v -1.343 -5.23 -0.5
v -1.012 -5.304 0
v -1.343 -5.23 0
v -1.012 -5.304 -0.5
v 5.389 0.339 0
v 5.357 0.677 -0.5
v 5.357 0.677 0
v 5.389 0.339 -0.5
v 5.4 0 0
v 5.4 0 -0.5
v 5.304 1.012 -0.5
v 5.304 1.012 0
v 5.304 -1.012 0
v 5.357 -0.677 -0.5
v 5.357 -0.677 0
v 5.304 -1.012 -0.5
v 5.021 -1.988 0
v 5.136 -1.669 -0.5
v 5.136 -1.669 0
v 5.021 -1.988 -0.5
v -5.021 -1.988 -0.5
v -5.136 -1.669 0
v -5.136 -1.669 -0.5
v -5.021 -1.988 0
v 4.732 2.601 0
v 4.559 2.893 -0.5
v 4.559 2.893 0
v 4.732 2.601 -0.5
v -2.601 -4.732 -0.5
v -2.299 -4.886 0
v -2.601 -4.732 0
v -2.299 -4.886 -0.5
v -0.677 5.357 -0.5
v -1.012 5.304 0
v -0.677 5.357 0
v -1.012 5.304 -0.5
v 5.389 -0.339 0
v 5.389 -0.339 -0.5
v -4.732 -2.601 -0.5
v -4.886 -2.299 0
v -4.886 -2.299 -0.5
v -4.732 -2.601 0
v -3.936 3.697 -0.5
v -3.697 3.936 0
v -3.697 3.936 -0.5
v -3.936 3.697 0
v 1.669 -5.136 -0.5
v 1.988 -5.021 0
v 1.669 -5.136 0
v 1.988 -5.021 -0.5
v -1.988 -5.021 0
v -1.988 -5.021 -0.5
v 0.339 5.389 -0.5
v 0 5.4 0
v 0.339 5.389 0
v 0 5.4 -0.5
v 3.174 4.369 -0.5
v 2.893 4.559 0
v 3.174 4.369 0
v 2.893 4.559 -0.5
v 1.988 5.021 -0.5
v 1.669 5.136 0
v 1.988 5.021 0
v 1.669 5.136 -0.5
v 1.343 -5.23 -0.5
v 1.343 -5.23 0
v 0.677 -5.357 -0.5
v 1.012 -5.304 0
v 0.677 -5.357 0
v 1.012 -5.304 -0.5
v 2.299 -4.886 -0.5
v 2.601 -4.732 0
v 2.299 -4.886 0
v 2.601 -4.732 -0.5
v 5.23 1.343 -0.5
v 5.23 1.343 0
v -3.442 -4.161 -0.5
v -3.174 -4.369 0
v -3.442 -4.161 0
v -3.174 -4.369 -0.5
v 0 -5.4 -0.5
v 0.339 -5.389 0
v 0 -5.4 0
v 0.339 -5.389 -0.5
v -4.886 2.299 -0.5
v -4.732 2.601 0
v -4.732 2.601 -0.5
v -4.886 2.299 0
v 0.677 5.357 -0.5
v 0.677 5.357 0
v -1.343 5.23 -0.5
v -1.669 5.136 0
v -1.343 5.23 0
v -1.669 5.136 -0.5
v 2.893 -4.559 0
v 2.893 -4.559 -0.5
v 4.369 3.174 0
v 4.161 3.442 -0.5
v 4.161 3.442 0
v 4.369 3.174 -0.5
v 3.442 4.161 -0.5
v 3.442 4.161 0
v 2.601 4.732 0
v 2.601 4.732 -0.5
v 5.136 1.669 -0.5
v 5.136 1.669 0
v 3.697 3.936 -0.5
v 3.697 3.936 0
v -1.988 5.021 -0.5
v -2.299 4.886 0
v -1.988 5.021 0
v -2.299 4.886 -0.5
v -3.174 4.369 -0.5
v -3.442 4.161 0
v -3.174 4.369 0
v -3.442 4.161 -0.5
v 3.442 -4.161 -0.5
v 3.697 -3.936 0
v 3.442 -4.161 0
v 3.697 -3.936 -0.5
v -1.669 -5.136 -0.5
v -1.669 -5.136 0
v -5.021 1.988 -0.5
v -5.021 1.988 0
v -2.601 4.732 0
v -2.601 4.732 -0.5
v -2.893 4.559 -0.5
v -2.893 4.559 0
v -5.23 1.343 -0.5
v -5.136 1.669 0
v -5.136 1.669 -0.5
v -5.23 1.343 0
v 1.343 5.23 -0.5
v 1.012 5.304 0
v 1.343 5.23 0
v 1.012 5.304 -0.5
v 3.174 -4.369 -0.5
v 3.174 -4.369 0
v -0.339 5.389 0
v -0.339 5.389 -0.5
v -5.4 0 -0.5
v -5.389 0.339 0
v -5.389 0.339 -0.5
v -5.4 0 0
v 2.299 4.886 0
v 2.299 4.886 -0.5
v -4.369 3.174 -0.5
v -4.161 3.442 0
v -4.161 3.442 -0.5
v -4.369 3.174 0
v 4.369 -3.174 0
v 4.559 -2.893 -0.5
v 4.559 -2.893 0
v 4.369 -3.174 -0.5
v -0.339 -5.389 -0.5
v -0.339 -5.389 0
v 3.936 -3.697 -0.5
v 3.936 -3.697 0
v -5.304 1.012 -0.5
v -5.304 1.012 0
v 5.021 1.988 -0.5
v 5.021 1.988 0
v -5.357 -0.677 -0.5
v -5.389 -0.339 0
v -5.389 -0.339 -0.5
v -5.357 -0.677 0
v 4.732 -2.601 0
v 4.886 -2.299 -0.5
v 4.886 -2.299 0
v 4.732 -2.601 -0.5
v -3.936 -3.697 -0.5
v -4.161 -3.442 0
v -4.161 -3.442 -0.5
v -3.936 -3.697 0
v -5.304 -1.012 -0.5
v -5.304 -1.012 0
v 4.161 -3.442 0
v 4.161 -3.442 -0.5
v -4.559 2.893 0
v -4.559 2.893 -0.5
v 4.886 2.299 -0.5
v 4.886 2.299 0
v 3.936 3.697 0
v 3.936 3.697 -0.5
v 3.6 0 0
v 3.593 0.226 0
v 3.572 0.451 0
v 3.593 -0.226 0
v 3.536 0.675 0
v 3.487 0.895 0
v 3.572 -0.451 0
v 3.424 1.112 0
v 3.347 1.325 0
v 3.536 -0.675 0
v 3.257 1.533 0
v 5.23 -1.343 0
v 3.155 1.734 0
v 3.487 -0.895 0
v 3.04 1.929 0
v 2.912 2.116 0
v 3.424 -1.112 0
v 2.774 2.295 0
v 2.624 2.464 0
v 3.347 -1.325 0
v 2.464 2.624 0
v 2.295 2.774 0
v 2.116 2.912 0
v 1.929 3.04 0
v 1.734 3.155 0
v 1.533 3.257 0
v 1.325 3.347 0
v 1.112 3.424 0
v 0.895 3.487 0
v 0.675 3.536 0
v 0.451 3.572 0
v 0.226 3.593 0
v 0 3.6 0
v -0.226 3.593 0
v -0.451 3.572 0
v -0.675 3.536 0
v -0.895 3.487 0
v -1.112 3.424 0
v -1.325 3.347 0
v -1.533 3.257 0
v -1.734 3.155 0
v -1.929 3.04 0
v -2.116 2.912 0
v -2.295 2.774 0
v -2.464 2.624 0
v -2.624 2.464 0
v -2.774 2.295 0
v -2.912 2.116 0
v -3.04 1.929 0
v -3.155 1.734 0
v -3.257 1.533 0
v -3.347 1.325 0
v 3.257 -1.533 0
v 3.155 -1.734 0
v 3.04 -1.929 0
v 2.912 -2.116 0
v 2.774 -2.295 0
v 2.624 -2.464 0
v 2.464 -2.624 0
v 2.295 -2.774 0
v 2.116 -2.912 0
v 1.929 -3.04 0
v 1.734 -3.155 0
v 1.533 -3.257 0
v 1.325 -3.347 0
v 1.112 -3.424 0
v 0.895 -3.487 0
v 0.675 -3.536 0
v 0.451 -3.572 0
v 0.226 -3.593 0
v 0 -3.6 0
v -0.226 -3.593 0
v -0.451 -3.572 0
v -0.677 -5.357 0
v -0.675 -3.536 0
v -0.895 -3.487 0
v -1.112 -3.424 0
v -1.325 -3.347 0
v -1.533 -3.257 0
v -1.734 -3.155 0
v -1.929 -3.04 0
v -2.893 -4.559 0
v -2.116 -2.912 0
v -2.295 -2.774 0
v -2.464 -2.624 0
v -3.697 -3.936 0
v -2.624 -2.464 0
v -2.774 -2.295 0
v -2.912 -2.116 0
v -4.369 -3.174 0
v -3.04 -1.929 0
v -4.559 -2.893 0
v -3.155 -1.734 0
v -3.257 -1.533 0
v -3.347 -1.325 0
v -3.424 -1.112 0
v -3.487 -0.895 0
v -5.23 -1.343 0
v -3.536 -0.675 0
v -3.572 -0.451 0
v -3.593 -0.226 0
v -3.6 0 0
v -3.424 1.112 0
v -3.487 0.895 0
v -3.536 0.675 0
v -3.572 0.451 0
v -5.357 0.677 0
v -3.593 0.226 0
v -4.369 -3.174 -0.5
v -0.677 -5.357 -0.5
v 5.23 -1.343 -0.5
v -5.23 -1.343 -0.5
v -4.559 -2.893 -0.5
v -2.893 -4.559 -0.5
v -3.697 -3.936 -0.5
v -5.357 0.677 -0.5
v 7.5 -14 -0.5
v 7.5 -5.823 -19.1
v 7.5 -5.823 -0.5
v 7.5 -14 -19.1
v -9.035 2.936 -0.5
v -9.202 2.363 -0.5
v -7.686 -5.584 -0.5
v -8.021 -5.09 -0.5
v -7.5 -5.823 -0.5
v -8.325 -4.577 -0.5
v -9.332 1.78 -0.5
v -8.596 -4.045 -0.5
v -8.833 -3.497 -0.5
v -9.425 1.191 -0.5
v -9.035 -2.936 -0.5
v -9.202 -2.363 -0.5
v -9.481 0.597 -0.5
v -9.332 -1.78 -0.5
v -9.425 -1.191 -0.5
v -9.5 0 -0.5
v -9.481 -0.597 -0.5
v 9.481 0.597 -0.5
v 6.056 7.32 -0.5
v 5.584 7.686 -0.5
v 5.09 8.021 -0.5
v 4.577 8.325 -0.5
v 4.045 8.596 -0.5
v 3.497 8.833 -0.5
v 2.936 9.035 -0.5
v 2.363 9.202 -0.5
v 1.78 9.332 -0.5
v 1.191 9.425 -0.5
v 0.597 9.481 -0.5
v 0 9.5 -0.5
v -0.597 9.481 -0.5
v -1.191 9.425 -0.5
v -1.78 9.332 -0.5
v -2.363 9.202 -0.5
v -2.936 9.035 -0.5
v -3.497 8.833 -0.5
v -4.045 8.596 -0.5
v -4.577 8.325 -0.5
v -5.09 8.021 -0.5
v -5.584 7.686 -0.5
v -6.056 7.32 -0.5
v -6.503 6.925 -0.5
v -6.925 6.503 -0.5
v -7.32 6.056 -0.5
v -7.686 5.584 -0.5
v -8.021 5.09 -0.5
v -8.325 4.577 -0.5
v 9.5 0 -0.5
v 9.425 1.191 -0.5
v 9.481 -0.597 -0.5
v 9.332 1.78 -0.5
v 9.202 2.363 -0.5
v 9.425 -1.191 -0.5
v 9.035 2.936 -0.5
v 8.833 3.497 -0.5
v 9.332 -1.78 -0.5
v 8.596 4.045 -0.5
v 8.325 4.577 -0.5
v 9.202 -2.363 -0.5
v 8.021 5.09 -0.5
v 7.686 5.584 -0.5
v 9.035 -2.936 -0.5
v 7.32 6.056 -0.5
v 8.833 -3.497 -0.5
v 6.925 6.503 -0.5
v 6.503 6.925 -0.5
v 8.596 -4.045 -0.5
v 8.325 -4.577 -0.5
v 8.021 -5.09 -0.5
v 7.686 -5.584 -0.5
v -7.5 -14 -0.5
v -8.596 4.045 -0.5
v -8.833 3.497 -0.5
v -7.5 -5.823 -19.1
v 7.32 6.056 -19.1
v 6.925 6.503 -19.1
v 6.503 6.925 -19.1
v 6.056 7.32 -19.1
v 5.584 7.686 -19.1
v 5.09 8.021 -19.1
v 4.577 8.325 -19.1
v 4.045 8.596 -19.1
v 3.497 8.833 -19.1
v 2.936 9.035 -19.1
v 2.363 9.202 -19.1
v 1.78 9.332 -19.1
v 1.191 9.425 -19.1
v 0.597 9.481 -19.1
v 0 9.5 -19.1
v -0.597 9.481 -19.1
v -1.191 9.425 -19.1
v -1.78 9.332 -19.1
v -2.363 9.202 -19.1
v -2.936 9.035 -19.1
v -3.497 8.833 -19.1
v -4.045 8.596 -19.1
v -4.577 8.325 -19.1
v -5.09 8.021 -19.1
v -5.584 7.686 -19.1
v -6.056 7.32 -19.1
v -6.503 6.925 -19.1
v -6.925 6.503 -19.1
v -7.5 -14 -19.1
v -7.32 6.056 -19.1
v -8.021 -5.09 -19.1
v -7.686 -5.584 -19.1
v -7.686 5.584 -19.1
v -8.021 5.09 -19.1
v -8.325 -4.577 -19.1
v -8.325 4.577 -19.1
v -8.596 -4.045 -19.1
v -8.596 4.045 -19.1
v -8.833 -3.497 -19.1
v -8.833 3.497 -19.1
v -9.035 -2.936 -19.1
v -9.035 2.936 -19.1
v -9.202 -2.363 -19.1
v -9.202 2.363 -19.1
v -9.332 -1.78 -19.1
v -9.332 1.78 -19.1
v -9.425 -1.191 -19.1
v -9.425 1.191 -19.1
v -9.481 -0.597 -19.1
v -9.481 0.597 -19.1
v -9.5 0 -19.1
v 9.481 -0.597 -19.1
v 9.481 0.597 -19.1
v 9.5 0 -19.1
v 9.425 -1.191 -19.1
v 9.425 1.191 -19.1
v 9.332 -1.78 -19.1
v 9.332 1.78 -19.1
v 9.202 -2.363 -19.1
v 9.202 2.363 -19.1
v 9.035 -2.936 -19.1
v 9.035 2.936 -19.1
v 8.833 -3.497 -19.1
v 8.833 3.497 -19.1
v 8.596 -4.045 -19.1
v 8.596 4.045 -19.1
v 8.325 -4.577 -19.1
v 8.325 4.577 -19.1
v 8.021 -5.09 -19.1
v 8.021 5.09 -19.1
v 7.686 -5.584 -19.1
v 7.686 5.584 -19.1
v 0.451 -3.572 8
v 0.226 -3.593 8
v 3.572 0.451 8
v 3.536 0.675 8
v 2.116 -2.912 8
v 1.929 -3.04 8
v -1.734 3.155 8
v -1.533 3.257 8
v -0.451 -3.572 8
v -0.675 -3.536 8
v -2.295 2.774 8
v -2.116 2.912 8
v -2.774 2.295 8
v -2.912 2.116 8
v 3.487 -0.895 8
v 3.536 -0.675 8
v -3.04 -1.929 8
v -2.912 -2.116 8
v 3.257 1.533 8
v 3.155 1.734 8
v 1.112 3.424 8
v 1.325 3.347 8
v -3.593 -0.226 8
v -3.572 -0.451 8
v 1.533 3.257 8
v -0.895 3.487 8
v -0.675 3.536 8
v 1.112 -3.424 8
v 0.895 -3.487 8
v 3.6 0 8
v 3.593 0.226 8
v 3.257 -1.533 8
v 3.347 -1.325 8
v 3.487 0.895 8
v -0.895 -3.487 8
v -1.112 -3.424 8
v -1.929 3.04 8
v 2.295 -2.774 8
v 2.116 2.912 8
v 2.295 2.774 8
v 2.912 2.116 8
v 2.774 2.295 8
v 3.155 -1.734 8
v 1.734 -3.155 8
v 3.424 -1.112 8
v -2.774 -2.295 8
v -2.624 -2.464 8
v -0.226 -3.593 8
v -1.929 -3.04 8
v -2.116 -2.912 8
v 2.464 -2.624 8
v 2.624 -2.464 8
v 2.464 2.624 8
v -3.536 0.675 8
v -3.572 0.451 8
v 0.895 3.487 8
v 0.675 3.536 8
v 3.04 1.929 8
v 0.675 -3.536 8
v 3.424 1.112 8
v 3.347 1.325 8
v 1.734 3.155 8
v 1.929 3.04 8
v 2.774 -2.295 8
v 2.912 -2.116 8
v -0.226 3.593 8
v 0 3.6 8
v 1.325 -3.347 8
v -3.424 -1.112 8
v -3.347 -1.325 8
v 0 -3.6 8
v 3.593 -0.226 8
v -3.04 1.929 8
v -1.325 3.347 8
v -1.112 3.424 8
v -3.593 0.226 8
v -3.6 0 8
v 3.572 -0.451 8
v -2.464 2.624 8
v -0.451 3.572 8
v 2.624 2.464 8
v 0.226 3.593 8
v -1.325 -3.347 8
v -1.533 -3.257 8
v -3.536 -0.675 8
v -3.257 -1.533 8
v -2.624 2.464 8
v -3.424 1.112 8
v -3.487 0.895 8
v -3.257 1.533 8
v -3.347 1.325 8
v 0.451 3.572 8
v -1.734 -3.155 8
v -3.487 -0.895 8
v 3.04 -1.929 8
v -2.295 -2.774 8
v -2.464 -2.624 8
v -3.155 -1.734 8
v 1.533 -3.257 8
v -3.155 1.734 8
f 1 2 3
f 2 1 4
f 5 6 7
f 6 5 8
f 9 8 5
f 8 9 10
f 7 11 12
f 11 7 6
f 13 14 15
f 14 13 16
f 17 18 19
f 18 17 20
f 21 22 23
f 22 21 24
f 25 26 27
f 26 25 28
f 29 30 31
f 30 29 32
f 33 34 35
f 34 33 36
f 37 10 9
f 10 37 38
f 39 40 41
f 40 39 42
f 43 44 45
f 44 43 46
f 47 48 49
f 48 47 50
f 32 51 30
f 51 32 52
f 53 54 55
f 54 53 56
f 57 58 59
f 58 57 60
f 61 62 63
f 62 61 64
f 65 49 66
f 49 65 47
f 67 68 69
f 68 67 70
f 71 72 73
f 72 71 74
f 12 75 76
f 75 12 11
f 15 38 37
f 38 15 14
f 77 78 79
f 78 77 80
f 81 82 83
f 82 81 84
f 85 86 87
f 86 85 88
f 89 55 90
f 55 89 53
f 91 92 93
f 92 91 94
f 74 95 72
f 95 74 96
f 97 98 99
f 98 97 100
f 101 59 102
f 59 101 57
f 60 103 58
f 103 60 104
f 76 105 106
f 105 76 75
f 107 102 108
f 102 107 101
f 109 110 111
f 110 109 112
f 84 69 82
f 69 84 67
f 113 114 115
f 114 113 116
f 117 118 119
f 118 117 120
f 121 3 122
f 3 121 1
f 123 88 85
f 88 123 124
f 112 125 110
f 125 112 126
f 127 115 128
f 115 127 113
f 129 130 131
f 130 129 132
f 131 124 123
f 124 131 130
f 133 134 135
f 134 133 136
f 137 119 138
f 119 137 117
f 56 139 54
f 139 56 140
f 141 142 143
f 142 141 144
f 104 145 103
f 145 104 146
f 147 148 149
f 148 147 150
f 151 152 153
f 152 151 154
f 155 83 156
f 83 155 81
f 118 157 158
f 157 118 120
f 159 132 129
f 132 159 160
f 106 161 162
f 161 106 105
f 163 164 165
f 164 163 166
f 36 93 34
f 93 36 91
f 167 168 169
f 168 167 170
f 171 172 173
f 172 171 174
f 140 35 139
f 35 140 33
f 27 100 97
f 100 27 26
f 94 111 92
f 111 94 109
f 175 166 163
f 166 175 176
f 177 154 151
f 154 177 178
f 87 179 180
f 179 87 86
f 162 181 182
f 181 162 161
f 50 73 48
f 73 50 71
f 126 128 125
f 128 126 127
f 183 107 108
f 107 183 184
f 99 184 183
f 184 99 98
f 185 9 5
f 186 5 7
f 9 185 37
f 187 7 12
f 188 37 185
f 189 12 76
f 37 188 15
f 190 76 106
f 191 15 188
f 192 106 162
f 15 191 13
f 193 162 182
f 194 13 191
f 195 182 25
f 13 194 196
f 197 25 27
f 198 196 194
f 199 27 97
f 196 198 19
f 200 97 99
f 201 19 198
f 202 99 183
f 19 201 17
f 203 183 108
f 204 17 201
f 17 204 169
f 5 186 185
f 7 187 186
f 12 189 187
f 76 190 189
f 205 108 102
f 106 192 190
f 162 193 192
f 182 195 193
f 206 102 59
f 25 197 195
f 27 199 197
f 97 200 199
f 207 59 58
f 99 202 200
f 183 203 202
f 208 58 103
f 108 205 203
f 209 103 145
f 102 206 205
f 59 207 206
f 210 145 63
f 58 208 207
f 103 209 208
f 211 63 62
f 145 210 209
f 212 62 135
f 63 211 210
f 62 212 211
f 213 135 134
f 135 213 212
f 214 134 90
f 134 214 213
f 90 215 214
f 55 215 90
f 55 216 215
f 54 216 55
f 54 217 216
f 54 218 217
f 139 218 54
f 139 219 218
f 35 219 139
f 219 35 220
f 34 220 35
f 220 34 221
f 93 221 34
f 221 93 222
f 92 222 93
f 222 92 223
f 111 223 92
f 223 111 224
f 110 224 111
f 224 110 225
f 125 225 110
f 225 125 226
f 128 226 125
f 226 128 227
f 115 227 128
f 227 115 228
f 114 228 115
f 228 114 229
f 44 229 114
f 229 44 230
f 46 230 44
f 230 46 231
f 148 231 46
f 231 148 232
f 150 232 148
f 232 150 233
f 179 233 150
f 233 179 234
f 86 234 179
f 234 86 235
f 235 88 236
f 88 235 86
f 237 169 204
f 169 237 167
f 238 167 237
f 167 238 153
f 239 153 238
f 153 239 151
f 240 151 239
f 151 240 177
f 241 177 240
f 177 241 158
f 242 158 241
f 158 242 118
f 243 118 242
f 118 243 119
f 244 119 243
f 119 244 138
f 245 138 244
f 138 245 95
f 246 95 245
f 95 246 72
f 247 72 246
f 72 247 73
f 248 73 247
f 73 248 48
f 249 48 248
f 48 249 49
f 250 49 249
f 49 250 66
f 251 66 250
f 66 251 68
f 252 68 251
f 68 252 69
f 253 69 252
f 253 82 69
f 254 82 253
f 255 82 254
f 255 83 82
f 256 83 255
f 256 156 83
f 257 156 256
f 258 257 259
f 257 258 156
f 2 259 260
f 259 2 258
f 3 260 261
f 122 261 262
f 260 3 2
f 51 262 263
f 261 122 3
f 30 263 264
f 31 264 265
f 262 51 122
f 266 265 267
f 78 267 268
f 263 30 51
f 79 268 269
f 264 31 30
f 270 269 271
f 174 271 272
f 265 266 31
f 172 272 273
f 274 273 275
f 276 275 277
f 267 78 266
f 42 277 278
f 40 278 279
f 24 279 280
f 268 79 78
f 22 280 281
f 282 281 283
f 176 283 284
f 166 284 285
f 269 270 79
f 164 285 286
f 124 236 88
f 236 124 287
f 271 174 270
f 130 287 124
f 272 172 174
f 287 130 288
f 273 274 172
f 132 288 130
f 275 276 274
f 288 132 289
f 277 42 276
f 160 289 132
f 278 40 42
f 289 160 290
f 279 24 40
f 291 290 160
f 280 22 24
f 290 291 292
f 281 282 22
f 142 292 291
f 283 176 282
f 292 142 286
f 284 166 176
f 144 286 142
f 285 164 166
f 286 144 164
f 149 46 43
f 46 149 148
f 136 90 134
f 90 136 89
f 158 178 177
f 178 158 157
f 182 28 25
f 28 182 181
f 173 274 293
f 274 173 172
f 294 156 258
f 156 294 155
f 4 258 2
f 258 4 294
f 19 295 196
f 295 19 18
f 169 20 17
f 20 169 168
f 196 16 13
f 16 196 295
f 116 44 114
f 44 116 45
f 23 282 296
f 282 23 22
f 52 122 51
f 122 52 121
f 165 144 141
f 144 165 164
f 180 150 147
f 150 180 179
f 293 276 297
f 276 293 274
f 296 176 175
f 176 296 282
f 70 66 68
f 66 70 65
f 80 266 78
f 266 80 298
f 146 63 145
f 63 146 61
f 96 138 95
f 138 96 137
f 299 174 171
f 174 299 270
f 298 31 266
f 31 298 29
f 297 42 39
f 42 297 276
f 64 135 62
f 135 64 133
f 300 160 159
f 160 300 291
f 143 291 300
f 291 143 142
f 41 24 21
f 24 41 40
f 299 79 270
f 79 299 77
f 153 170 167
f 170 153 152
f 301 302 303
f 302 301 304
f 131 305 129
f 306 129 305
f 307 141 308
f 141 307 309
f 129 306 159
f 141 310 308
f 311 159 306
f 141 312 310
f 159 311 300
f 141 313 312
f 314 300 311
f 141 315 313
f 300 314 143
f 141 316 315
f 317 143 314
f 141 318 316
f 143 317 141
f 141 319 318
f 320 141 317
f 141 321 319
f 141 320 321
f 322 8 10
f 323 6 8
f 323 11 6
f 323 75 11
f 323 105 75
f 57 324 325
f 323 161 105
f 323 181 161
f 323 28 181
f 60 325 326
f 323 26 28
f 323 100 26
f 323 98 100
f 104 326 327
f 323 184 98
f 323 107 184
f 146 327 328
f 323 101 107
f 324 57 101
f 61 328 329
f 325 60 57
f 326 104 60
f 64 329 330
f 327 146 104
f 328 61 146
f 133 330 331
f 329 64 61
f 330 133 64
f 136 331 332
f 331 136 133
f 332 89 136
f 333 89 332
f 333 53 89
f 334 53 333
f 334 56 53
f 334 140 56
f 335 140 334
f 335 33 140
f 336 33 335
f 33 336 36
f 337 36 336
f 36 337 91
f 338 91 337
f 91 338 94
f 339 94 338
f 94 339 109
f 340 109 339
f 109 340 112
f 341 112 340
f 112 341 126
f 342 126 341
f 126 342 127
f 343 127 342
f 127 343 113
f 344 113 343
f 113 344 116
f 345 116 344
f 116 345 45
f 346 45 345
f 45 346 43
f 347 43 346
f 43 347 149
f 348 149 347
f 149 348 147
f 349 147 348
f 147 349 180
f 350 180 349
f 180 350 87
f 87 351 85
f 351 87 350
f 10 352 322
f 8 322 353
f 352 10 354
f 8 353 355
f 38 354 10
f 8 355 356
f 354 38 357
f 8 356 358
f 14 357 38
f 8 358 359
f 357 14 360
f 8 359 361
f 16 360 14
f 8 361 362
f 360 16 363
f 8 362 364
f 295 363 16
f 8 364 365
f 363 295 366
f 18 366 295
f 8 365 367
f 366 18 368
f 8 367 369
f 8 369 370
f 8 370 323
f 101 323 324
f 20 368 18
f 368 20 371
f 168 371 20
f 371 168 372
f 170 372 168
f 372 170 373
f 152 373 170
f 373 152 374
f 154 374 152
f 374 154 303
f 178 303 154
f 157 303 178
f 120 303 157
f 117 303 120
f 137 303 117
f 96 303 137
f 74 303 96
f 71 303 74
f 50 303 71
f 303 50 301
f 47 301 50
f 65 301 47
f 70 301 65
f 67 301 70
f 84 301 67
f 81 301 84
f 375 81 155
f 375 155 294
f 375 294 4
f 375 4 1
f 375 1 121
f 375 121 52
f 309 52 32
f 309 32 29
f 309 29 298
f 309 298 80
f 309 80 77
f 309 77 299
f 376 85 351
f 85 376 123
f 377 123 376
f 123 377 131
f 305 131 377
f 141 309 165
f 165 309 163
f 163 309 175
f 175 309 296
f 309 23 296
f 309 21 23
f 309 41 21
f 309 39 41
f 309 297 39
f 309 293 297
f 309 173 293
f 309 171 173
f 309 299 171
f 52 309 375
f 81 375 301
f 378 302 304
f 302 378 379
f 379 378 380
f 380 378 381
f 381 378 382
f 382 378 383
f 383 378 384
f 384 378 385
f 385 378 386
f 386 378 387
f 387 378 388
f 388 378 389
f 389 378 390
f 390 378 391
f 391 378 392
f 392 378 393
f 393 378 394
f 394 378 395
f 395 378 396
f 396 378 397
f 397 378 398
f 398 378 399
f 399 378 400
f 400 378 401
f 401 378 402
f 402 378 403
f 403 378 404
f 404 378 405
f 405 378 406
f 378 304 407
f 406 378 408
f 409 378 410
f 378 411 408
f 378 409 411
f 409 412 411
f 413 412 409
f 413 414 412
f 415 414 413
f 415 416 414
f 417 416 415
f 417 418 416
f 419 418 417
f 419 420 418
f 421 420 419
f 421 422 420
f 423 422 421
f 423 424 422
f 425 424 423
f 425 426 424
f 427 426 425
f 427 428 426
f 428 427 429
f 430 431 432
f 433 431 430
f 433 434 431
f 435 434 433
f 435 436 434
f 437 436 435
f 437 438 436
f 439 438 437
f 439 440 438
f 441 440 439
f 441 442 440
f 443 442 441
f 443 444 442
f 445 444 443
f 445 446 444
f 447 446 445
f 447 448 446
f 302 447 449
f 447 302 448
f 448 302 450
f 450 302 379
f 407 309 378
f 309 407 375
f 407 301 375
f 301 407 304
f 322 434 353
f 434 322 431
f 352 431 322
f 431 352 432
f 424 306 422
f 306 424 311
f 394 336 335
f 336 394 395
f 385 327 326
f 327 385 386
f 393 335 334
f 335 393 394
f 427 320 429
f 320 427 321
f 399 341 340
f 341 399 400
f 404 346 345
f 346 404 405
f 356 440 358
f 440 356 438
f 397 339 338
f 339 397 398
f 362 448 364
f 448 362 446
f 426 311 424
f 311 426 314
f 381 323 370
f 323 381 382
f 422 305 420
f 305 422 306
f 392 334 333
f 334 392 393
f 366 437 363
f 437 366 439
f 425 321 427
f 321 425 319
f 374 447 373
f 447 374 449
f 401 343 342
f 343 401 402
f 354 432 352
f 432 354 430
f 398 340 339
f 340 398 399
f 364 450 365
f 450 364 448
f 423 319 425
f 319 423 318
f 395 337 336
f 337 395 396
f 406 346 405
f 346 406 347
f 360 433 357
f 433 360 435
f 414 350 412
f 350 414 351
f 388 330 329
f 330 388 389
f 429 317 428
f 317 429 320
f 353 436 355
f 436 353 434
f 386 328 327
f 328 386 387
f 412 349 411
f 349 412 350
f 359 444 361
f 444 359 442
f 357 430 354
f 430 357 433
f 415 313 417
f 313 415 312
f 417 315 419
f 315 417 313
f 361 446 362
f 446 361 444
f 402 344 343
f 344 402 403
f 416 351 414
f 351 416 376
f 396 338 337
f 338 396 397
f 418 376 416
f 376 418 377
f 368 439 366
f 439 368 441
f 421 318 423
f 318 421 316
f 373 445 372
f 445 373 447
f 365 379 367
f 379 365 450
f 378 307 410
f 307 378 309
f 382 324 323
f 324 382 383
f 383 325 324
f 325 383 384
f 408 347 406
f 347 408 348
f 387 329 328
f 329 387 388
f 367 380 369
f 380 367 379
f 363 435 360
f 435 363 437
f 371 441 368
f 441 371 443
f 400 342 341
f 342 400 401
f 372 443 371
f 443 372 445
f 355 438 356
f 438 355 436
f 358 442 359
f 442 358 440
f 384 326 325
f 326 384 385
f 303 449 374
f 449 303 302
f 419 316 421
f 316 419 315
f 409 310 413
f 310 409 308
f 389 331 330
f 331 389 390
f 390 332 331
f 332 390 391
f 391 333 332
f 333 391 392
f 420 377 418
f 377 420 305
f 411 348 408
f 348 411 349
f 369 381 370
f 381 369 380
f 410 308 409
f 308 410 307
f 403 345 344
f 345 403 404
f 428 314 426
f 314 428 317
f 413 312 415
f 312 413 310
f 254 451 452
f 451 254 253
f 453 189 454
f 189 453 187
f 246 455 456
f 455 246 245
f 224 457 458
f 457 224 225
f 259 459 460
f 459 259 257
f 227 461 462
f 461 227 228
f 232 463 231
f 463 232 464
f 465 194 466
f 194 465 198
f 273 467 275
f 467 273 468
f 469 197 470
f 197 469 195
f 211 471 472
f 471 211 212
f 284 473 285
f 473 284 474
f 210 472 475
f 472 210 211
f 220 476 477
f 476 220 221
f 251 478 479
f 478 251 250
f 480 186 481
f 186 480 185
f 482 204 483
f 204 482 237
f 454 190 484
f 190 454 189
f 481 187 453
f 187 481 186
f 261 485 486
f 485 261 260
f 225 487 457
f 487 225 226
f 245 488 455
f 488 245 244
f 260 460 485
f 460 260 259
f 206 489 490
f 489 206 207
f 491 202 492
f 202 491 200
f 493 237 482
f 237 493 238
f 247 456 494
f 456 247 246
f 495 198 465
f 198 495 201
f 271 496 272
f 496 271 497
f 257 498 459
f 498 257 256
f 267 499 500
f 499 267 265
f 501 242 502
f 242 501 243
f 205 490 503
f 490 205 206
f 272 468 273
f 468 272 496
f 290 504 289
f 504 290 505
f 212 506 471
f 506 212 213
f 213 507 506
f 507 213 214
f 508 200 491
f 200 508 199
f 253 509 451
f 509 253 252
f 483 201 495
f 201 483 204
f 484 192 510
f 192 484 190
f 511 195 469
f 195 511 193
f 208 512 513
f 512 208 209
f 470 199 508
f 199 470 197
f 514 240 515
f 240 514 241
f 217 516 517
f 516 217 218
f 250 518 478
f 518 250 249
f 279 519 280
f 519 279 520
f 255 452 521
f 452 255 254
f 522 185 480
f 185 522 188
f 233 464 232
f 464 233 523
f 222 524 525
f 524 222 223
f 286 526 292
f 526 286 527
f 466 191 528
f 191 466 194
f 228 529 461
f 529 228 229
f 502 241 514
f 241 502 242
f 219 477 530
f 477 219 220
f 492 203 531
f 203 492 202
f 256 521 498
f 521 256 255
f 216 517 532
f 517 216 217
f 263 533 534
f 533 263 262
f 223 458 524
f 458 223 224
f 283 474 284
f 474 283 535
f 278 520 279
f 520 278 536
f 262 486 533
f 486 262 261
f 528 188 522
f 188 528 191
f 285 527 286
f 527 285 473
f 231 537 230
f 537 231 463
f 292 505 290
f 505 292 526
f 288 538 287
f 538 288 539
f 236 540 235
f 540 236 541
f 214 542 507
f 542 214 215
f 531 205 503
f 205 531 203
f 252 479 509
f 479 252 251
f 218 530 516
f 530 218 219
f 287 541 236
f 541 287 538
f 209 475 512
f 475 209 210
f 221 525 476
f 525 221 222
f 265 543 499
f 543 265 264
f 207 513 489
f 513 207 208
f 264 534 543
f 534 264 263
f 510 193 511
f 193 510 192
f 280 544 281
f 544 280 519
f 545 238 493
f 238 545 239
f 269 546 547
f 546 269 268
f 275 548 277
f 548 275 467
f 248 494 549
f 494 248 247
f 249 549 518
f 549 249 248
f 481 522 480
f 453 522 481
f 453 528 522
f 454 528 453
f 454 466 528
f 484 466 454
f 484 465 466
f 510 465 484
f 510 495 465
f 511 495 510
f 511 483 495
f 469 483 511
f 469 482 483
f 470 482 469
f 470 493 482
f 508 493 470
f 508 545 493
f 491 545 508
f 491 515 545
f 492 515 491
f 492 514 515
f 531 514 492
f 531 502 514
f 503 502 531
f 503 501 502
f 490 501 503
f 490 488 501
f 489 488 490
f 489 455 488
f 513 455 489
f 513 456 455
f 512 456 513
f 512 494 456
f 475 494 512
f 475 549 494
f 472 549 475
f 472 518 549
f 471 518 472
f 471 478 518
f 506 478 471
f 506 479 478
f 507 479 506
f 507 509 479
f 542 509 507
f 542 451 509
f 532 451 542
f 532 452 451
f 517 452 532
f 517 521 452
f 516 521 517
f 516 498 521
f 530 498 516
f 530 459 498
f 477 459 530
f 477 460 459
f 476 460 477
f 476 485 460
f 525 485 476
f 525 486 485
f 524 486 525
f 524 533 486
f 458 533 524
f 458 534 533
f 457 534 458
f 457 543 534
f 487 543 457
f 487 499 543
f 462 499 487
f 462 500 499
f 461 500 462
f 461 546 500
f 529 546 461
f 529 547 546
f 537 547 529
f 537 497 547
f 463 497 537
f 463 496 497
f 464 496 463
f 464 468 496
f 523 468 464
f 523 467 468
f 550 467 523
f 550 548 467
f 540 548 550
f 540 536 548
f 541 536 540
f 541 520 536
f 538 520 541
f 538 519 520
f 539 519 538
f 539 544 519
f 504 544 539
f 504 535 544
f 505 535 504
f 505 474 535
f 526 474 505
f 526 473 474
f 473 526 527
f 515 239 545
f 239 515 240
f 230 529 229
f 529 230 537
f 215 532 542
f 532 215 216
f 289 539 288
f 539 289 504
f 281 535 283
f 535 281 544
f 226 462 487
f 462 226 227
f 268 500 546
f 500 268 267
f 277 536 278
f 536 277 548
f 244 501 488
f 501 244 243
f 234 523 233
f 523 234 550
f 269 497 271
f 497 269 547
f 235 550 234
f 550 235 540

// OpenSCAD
$fn=100; 

module pot_alpha_16mm(){
    
    
    shaft_height = 8;
    translate([0, 0, shaft_height/2]){
        cylinder(r=3.6, h=shaft_height, center=true);
    }
    
    translate([0, 0, -0.5]){
        cylinder(r=5.4, h=1, center=true);
        
        body_height = 18.6;
        
        translate([-7.5, -14, -body_height]) cube([15, 14, body_height]);
        translate([0, 0, -body_height/2]){
            cylinder(r=9.5, h=body_height, center=true);
            
        }      
    }
    

}

pot_alpha_16mm();
